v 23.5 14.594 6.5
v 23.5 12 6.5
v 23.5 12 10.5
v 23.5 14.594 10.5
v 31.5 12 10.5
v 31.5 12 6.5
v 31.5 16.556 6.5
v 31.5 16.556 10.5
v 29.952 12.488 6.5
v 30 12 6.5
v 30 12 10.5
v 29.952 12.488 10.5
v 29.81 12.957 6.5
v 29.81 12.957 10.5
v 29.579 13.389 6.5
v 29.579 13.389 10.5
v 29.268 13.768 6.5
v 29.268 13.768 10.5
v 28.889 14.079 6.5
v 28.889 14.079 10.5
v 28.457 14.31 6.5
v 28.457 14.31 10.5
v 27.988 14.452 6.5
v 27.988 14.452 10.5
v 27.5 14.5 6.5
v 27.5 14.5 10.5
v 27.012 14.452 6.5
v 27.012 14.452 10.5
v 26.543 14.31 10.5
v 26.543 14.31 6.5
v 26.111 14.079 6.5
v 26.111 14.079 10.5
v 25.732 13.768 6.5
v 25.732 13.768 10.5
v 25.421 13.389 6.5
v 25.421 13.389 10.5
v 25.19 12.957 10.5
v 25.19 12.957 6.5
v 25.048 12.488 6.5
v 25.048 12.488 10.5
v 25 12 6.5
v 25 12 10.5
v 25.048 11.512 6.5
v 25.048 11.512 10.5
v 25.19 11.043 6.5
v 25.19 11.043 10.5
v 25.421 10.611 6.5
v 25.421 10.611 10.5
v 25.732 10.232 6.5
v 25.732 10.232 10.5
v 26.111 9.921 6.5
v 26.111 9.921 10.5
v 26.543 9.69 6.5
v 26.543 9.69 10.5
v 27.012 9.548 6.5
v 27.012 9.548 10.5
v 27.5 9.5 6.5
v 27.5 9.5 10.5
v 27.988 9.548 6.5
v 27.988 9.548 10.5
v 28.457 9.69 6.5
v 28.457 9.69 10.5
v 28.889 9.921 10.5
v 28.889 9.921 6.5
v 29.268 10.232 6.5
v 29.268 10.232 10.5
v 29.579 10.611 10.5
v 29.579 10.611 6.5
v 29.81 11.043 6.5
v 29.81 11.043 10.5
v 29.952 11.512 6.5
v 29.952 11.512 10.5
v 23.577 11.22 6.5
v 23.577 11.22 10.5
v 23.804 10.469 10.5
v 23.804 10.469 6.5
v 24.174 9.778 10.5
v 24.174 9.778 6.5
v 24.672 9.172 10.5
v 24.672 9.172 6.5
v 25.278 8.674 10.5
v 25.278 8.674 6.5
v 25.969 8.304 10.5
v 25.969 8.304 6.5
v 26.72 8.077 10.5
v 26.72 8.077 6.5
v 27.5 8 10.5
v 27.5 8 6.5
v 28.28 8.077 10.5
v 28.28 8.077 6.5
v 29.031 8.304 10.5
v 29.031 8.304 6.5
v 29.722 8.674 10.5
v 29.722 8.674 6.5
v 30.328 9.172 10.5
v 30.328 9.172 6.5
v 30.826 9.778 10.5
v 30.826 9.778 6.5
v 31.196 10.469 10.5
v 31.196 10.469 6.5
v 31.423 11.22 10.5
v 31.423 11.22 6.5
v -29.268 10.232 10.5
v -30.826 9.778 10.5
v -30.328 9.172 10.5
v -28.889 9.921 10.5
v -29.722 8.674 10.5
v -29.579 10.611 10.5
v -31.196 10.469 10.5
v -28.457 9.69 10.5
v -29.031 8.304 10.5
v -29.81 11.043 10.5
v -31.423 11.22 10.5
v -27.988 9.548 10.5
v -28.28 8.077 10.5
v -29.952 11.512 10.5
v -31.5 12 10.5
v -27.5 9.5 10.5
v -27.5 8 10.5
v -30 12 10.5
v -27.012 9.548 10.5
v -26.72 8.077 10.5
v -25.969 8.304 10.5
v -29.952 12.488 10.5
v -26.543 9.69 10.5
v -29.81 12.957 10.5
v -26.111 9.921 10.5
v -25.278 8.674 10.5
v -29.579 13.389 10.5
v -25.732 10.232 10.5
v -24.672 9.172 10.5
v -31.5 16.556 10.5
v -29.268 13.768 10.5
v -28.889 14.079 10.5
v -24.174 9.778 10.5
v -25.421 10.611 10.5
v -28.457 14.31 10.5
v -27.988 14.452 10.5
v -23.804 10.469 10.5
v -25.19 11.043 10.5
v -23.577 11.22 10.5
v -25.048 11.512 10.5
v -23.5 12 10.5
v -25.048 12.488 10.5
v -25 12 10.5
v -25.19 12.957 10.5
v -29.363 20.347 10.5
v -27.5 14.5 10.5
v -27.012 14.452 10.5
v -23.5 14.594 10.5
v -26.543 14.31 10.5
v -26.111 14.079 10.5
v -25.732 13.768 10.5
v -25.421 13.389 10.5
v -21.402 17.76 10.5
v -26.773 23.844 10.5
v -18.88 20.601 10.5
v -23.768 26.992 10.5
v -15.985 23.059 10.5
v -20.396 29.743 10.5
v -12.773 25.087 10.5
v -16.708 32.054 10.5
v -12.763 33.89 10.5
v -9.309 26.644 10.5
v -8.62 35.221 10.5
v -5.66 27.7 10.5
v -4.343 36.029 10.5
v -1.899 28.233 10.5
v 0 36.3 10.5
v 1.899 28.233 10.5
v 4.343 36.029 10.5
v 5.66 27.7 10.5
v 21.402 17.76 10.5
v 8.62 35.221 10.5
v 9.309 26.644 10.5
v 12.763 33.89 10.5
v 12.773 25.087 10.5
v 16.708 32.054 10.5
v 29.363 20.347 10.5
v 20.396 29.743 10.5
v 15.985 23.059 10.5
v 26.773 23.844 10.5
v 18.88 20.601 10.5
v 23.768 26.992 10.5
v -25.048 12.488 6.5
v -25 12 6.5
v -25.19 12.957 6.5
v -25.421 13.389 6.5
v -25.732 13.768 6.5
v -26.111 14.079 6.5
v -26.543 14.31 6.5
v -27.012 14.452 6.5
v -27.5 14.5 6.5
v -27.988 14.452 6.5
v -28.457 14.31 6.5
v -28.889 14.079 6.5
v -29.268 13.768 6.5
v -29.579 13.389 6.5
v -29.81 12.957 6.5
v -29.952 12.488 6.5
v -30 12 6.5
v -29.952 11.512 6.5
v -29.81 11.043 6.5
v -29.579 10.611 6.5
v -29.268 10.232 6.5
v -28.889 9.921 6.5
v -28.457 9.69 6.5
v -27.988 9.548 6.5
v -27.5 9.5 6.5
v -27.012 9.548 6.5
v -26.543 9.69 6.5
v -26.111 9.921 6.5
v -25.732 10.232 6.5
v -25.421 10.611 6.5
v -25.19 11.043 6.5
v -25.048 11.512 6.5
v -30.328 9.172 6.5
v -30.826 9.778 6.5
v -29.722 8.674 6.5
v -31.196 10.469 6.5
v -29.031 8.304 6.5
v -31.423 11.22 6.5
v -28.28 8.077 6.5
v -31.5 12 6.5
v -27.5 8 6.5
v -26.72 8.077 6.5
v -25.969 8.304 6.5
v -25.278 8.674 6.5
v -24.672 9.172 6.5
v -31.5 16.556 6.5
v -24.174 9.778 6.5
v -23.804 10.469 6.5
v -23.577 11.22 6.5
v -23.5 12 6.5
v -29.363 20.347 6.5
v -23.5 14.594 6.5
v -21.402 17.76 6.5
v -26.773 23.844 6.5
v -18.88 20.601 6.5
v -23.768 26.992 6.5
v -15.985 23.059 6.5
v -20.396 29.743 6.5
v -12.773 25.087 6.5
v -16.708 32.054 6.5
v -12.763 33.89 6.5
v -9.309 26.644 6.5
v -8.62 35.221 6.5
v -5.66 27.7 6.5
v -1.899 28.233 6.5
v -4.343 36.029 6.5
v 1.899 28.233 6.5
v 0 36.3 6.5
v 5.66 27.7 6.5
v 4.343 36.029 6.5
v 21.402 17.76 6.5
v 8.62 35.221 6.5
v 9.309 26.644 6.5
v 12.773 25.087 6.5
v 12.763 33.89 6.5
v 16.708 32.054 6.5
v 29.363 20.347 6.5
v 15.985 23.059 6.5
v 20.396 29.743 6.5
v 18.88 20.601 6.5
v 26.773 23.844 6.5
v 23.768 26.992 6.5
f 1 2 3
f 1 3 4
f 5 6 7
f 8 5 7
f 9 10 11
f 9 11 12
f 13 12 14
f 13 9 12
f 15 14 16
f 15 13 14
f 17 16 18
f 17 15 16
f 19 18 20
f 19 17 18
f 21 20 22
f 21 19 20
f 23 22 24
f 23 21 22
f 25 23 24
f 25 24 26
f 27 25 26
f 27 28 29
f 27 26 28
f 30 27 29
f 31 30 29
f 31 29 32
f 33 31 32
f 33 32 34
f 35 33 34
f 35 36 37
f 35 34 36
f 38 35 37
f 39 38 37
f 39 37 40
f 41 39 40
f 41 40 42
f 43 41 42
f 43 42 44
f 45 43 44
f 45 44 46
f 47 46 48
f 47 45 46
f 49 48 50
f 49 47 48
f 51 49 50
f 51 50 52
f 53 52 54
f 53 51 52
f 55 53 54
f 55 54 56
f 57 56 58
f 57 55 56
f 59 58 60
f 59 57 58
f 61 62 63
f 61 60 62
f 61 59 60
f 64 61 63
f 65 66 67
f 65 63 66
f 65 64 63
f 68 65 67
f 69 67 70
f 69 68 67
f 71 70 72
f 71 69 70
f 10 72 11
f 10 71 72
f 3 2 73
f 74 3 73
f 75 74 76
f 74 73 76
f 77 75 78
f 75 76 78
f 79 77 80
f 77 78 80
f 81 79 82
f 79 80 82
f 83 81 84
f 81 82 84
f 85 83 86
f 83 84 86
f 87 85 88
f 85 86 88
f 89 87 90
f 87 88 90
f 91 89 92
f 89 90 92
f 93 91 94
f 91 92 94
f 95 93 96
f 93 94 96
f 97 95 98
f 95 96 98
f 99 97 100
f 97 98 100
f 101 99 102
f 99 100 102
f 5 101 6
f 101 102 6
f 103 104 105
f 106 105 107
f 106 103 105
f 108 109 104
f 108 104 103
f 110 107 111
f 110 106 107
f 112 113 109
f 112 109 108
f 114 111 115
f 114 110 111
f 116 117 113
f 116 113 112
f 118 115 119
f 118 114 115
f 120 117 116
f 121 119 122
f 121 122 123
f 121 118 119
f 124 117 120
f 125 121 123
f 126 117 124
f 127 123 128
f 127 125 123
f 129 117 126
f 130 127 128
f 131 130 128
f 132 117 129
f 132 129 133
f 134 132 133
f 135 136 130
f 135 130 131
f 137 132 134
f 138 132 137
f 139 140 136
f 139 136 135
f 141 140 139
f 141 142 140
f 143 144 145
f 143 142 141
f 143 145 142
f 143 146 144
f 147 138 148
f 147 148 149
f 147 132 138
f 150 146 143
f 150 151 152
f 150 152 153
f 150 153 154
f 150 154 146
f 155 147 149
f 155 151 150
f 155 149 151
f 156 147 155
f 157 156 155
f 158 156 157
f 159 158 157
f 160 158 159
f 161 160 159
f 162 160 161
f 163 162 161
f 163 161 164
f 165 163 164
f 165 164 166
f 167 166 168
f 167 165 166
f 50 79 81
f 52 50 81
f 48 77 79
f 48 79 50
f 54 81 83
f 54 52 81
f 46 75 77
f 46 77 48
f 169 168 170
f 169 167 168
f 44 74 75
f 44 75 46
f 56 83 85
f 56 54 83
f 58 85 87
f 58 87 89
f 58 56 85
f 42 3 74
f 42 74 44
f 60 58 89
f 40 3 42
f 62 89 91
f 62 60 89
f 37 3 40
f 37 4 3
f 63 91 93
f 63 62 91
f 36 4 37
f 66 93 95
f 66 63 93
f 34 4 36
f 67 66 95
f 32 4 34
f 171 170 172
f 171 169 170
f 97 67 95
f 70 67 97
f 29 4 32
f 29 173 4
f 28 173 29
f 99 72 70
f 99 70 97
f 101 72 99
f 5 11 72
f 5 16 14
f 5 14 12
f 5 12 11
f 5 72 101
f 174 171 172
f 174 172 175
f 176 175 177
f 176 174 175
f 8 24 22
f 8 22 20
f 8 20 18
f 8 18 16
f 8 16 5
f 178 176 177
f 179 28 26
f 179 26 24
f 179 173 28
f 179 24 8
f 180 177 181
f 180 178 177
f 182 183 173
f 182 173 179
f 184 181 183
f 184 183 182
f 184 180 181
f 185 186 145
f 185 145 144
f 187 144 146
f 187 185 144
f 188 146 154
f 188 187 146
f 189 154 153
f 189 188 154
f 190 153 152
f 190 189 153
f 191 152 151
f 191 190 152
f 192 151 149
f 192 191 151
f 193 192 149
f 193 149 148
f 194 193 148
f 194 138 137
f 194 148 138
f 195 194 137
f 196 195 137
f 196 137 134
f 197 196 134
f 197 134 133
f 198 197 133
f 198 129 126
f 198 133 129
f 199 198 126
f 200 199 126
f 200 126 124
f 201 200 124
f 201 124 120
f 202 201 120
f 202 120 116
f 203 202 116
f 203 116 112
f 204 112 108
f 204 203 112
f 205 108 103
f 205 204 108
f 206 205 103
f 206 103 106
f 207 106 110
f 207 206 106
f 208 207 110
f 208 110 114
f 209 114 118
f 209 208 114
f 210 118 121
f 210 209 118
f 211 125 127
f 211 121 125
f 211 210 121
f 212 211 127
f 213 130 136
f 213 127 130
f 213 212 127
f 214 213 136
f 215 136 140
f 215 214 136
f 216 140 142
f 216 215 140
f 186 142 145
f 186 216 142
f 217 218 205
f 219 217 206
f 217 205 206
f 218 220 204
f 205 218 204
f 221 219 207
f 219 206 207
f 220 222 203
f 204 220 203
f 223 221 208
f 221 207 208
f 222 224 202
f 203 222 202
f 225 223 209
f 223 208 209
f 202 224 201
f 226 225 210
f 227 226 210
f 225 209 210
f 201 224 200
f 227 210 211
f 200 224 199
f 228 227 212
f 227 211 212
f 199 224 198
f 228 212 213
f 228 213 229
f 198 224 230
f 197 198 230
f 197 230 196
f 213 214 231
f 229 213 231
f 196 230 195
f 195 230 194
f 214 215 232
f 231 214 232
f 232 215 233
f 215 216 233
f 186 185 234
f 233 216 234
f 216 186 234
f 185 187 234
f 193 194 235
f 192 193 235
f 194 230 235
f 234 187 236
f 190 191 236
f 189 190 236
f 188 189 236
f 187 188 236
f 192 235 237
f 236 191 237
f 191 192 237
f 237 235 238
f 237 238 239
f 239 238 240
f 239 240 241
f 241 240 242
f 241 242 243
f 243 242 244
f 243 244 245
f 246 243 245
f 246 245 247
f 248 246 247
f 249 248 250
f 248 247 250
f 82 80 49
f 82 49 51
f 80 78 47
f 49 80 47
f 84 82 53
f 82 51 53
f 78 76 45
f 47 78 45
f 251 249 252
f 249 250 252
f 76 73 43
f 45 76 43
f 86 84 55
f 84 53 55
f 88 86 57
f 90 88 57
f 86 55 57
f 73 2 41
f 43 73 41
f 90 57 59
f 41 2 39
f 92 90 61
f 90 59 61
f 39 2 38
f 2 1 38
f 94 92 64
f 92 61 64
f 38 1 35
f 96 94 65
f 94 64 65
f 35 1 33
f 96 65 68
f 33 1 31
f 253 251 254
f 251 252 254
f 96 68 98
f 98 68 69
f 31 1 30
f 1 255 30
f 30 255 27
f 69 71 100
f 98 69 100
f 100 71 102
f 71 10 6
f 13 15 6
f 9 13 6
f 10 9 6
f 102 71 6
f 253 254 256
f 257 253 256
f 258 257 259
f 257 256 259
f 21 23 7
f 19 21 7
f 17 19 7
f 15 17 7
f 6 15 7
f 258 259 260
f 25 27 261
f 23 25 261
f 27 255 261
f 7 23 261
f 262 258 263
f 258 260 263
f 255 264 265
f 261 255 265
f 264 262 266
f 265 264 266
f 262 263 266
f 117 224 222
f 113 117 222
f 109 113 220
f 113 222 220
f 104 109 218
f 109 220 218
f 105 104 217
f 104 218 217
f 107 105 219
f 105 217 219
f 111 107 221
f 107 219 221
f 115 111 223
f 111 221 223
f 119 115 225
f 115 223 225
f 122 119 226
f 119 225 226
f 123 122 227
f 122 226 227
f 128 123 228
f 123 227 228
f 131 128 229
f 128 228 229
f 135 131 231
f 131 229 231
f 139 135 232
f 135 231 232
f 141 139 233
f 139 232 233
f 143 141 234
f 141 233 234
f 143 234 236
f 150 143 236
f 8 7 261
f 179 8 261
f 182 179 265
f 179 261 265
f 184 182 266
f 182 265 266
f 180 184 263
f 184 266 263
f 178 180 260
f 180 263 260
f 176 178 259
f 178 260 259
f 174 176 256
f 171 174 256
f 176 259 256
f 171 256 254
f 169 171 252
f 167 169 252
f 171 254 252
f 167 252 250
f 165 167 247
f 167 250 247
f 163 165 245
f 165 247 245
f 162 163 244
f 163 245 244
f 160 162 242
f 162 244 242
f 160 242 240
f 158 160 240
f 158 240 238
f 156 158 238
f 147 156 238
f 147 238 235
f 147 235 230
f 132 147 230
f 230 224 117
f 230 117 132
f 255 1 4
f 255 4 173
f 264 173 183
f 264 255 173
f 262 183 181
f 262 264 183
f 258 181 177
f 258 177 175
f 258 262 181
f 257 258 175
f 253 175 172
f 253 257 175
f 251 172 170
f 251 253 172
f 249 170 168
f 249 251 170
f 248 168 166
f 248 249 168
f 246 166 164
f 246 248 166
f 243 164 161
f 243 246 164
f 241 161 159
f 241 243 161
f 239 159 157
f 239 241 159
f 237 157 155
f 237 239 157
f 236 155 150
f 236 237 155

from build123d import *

# Parameters (mm, degrees)
CYLINDER023_R     = 2.5
CYLINDER023_DEPTH = 7.5
CYLINDER022_R     = 2.5
CYLINDER022_DEPTH = 7.5
EXTRUDE001_DEPTH  = 4


with BuildPart() as cilindro018:
    # Cylinder023 → Cylinder023 (new body)
    with BuildSketch(Plane(origin=(27.5, 12, 5), x_dir=(1, 0, 0), z_dir=(0, 0, 1))):
        Circle(CYLINDER023_R)
    extrude(amount=CYLINDER023_DEPTH)


with BuildPart() as fusion011:
    # Cylinder022 → Cylinder022 (new body)
    with BuildSketch(Plane(origin=(-27.5, 12, 5), x_dir=(1, 0, 0), z_dir=(0, 0, 1))):
        Circle(CYLINDER022_R)
    extrude(amount=CYLINDER022_DEPTH)

    # Fusion011: union Cilindro018
    add(cilindro018.part)


with BuildPart() as cut005:
    # Sketch006 (on Face2 of Cylinder008) → Extrude001 (new body)
    with BuildSketch(Plane(origin=(0, 12, 1.5), x_dir=(1, 0, 0), z_dir=(0, 0, 1))):
        with BuildLine():
            ThreePointArc((23.5, 0), (27.5, -4), (31.5, 0))
            Line((31.5, 0), (31.5, 4.555666))
            ThreePointArc((31.5, 4.555666), (0, 24.29952), (-31.5, 4.555666))
            Line((-31.5, 0), (-31.5, 4.555666))
            ThreePointArc((-31.5, 0), (-27.5, -4), (-23.5, 0))
            Line((-23.5, 0), (-23.5, 2.594256))
            ThreePointArc((23.5, 2.594256), (0, 16.29952), (-23.5, 2.594256))
            Line((23.5, 0), (23.5, 2.594256))
        make_face()
    extrude(amount=EXTRUDE001_DEPTH)


with BuildPart() as cut005_1:
    # Extrude001 placement: moved
    add(cut005.part.moved(Location((0, 0, 5))))

    # Cut005: cut Fusion011
    add(fusion011.part, mode=Mode.SUBTRACT)


solid = cut005_1.part
